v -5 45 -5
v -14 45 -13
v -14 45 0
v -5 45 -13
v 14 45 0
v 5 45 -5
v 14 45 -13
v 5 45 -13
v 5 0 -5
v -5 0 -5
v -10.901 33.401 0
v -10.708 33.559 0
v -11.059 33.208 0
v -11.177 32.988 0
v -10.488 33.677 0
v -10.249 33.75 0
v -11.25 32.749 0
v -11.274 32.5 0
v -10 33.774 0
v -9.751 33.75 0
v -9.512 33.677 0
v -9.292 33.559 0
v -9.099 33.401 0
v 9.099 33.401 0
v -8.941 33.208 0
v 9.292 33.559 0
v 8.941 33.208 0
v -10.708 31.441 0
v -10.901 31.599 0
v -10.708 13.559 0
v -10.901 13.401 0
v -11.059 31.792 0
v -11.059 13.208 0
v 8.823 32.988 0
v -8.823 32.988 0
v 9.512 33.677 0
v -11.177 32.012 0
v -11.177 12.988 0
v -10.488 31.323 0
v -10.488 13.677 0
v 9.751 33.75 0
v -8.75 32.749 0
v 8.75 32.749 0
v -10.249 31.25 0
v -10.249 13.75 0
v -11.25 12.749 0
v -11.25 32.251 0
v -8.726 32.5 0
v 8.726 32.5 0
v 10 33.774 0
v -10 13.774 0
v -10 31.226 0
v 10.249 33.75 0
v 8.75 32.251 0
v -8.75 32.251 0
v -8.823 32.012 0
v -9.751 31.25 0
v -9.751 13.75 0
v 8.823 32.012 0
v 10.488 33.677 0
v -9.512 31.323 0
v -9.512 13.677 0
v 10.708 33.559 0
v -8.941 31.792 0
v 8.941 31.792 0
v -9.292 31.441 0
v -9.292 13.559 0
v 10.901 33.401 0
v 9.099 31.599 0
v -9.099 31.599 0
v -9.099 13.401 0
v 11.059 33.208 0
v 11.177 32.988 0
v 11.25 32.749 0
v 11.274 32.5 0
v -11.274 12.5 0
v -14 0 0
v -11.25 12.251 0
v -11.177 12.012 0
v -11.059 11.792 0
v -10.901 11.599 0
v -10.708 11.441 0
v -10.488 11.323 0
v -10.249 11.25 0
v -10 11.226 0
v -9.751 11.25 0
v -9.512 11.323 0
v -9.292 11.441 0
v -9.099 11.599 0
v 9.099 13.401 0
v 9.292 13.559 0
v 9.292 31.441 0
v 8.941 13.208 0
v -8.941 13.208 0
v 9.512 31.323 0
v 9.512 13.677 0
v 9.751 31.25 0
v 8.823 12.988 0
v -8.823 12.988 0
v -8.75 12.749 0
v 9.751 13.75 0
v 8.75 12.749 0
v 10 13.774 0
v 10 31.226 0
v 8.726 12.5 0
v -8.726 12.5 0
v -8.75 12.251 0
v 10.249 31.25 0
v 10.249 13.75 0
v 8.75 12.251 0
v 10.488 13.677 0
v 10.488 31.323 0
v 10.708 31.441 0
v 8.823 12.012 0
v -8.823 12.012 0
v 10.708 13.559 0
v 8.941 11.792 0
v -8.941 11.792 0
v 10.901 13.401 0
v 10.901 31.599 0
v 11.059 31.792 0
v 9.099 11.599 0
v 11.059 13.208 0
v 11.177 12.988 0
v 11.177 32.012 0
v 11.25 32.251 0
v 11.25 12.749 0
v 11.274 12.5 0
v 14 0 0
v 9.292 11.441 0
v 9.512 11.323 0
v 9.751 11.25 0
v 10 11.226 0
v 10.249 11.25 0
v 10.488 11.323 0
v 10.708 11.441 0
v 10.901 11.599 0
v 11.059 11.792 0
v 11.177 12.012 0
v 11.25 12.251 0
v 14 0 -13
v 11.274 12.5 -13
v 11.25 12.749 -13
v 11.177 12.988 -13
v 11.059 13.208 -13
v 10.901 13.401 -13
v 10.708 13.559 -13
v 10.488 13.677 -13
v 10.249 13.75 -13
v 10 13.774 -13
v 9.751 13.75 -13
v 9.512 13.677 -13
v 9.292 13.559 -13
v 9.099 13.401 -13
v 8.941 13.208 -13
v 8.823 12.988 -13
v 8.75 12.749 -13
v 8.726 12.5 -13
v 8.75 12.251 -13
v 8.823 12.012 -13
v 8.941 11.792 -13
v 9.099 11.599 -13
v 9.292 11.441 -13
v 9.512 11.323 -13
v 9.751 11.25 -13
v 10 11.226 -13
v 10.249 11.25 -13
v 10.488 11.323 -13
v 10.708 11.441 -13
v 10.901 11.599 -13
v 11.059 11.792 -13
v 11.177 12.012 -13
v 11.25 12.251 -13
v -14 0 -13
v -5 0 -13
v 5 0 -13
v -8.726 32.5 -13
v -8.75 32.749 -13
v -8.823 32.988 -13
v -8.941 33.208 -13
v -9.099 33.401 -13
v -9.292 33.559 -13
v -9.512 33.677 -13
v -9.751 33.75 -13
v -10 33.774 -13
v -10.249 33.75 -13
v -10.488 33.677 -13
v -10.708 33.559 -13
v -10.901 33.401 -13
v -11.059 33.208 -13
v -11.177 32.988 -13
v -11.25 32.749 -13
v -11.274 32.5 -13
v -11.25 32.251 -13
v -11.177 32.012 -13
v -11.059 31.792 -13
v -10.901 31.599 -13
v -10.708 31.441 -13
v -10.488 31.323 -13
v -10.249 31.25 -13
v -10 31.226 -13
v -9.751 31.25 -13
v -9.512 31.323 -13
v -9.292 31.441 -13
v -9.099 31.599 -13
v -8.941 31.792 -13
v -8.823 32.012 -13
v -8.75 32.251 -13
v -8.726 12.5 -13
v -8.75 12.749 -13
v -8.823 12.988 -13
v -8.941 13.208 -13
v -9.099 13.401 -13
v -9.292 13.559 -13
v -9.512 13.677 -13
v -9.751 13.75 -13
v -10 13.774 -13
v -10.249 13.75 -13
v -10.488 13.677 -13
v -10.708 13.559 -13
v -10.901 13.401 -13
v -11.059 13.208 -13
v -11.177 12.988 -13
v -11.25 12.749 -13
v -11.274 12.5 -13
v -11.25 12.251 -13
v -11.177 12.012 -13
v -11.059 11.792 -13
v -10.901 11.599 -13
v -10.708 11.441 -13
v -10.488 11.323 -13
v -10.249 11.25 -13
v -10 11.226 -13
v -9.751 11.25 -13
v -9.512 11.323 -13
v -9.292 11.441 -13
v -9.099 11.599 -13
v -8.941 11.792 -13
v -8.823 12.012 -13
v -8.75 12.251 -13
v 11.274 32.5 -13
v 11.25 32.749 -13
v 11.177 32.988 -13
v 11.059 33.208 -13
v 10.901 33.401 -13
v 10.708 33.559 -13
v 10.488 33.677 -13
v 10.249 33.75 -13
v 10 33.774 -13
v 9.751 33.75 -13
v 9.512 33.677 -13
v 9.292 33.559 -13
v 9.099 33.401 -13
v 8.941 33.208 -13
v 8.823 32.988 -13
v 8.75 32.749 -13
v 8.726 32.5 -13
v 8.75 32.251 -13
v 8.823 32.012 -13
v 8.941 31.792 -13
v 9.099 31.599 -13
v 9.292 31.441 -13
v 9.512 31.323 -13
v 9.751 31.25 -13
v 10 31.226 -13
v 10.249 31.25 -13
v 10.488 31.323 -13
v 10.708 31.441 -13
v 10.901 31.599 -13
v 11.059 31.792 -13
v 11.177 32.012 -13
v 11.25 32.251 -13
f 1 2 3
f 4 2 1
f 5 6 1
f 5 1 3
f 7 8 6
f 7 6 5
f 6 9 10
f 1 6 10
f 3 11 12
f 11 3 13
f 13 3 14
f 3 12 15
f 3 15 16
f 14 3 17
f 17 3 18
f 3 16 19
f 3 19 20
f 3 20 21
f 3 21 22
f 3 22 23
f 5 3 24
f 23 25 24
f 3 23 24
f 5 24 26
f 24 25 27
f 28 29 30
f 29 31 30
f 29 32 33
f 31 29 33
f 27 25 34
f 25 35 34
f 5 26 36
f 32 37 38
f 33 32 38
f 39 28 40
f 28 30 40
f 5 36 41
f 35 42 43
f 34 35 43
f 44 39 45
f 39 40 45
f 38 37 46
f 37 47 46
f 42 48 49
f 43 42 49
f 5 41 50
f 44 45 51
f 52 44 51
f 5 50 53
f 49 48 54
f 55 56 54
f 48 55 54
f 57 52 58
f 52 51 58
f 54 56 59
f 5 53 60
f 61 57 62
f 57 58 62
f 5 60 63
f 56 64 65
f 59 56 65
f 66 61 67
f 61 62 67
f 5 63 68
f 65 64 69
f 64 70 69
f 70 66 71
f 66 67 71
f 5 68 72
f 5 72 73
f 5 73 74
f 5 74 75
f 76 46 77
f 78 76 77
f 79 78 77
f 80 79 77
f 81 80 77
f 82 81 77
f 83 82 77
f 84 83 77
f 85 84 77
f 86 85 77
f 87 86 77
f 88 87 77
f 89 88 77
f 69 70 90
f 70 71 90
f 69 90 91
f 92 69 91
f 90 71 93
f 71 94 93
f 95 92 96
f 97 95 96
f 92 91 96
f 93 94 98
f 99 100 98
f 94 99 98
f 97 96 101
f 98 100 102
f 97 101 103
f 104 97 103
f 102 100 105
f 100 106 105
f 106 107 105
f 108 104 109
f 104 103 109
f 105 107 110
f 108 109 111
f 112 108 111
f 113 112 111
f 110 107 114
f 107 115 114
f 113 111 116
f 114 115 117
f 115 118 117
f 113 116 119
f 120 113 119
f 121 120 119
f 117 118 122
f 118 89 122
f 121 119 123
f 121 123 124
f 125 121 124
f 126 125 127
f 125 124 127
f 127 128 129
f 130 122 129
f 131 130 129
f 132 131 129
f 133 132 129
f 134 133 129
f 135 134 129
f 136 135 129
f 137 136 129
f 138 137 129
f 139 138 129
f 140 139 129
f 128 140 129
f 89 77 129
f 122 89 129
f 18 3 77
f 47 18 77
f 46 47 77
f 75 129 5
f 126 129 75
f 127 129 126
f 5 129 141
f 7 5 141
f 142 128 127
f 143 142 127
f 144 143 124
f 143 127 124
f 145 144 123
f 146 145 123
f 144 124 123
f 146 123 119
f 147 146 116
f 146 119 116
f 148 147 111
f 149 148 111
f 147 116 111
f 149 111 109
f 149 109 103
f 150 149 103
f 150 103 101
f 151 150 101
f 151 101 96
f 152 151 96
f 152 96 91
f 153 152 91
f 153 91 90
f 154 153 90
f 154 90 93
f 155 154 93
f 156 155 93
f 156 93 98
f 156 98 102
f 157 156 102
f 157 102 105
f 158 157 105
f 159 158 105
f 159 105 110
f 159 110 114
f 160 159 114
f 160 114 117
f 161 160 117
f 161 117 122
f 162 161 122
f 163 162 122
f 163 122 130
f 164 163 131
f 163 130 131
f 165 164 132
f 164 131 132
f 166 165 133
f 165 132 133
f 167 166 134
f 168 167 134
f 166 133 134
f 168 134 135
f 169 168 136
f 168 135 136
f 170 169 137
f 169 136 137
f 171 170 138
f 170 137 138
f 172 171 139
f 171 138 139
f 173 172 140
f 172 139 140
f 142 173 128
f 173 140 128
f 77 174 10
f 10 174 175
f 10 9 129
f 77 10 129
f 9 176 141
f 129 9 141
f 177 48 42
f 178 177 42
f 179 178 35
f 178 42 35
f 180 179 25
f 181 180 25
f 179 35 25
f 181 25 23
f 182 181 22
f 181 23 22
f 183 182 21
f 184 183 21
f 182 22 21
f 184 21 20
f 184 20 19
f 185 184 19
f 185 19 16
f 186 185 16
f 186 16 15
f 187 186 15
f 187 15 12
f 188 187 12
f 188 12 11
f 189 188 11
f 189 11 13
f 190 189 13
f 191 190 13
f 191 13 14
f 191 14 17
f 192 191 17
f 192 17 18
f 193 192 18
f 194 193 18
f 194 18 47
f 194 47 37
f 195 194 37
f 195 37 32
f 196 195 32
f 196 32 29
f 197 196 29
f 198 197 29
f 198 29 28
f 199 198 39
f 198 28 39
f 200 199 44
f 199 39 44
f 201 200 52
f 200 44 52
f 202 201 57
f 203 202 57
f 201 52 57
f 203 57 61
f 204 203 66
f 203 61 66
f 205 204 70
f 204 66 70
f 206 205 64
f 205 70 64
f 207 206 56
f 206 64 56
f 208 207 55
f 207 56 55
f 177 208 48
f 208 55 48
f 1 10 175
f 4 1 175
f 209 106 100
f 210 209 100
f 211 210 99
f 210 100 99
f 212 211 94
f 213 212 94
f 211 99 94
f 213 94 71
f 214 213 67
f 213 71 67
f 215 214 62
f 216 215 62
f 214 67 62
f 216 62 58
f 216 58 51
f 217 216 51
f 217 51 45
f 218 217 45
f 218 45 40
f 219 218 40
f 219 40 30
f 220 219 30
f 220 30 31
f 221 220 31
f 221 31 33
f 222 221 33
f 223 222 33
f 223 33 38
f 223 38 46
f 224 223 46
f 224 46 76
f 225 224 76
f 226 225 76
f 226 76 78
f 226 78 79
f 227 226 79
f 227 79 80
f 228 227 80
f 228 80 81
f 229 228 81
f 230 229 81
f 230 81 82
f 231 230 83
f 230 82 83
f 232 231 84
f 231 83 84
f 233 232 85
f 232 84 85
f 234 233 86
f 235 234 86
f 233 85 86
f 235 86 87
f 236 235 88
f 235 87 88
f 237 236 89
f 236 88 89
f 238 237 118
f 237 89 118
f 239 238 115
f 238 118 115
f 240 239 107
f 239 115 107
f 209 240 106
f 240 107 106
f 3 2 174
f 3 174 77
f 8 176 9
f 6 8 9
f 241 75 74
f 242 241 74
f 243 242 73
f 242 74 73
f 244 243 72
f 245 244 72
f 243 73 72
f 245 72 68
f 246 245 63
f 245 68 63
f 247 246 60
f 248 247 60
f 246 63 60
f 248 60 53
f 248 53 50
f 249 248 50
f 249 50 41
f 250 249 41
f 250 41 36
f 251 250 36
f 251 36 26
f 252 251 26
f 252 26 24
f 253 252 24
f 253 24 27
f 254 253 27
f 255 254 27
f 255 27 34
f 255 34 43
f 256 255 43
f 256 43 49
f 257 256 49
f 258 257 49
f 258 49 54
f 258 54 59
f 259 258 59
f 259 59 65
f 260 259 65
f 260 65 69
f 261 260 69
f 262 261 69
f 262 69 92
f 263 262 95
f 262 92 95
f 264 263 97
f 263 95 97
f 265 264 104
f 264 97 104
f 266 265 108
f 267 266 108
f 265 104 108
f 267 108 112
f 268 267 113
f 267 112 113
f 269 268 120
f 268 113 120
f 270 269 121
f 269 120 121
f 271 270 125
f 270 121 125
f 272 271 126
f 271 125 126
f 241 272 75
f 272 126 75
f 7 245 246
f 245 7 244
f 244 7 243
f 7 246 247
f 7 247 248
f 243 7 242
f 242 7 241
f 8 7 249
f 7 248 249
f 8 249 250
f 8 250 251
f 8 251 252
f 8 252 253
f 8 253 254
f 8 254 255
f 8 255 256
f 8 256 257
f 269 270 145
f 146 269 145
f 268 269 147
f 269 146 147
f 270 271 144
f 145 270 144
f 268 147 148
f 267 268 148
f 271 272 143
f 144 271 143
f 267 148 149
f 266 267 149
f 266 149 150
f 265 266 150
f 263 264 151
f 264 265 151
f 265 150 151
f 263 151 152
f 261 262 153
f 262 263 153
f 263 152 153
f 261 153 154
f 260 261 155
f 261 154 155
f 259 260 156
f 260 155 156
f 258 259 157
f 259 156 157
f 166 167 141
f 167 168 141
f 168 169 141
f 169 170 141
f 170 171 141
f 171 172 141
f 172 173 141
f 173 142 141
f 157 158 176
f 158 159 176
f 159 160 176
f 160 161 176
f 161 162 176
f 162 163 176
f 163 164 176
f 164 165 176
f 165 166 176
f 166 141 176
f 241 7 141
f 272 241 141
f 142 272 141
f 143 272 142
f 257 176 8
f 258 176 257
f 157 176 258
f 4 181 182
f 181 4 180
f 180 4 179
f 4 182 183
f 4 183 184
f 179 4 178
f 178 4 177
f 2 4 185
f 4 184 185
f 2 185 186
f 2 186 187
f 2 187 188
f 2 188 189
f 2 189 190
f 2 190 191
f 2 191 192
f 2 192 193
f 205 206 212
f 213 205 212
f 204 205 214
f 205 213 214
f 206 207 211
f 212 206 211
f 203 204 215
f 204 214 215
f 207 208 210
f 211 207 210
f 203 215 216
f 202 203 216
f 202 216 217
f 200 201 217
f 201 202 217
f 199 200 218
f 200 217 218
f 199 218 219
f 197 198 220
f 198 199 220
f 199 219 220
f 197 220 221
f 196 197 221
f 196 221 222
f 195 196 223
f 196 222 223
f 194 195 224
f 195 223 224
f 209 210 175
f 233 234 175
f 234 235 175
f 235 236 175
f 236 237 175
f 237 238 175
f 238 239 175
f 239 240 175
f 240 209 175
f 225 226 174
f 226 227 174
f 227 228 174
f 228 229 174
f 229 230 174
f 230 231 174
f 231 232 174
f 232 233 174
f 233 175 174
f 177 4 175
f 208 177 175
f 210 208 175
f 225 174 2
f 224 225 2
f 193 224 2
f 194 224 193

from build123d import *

# Parameters (mm, degrees)
BOSS_EXTRUDE1_DEPTH = 45
CUT_EXTRUDE1_REACH  = 50.888
SKETCH2_R           = 1.274102828


with BuildPart() as part:
    # Sketch1 → Boss-Extrude1 (new body)
    with BuildSketch(Plane(origin=(0, 0, 0), x_dir=(1, 0, 0), z_dir=(0, 1, 0))):
        Polygon((-5, 13), (-14, 13), (-14, 0), (14, 0), (14, 13), (5, 13), (5, 5), (-5, 5), align=None)
    extrude(amount=BOSS_EXTRUDE1_DEPTH)

    # Sketch2 → Cut-Extrude1 (cut, up to next)
    with BuildSketch(Plane.XY, mode=Mode.PRIVATE) as cut_extrude1_sk1:
        with Locations((-10, 32.5)):
            Circle(SKETCH2_R)
    cut_extrude1_tool1 = extrude(cut_extrude1_sk1.sketch, amount=-CUT_EXTRUDE1_REACH, mode=Mode.PRIVATE) & part.part
    # Sketch2 → Cut-Extrude1 (cut, up to next)
    with BuildSketch(Plane.XY, mode=Mode.PRIVATE) as cut_extrude1_sk2:
        with Locations((10, 32.5)):
            Circle(SKETCH2_R)
    cut_extrude1_tool2 = extrude(cut_extrude1_sk2.sketch, amount=-CUT_EXTRUDE1_REACH, mode=Mode.PRIVATE) & part.part
    # Sketch2 → Cut-Extrude1 (cut, up to next)
    with BuildSketch(Plane.XY, mode=Mode.PRIVATE) as cut_extrude1_sk3:
        with Locations((10, 12.5)):
            Circle(SKETCH2_R)
    cut_extrude1_tool3 = extrude(cut_extrude1_sk3.sketch, amount=-CUT_EXTRUDE1_REACH, mode=Mode.PRIVATE) & part.part
    # Sketch2 → Cut-Extrude1 (cut, up to next)
    with BuildSketch(Plane.XY, mode=Mode.PRIVATE) as cut_extrude1_sk4:
        with Locations((-10, 12.5)):
            Circle(SKETCH2_R)
    cut_extrude1_tool4 = extrude(cut_extrude1_sk4.sketch, amount=-CUT_EXTRUDE1_REACH, mode=Mode.PRIVATE) & part.part
    add(cut_extrude1_tool1.solids().sort_by_distance((-10, 32.5, 0))[0], mode=Mode.SUBTRACT)
    add(cut_extrude1_tool2.solids().sort_by_distance((10, 32.5, 0))[0], mode=Mode.SUBTRACT)
    add(cut_extrude1_tool3.solids().sort_by_distance((10, 12.5, 0))[0], mode=Mode.SUBTRACT)
    add(cut_extrude1_tool4.solids().sort_by_distance((-10, 12.5, 0))[0], mode=Mode.SUBTRACT)


solid = part.part
